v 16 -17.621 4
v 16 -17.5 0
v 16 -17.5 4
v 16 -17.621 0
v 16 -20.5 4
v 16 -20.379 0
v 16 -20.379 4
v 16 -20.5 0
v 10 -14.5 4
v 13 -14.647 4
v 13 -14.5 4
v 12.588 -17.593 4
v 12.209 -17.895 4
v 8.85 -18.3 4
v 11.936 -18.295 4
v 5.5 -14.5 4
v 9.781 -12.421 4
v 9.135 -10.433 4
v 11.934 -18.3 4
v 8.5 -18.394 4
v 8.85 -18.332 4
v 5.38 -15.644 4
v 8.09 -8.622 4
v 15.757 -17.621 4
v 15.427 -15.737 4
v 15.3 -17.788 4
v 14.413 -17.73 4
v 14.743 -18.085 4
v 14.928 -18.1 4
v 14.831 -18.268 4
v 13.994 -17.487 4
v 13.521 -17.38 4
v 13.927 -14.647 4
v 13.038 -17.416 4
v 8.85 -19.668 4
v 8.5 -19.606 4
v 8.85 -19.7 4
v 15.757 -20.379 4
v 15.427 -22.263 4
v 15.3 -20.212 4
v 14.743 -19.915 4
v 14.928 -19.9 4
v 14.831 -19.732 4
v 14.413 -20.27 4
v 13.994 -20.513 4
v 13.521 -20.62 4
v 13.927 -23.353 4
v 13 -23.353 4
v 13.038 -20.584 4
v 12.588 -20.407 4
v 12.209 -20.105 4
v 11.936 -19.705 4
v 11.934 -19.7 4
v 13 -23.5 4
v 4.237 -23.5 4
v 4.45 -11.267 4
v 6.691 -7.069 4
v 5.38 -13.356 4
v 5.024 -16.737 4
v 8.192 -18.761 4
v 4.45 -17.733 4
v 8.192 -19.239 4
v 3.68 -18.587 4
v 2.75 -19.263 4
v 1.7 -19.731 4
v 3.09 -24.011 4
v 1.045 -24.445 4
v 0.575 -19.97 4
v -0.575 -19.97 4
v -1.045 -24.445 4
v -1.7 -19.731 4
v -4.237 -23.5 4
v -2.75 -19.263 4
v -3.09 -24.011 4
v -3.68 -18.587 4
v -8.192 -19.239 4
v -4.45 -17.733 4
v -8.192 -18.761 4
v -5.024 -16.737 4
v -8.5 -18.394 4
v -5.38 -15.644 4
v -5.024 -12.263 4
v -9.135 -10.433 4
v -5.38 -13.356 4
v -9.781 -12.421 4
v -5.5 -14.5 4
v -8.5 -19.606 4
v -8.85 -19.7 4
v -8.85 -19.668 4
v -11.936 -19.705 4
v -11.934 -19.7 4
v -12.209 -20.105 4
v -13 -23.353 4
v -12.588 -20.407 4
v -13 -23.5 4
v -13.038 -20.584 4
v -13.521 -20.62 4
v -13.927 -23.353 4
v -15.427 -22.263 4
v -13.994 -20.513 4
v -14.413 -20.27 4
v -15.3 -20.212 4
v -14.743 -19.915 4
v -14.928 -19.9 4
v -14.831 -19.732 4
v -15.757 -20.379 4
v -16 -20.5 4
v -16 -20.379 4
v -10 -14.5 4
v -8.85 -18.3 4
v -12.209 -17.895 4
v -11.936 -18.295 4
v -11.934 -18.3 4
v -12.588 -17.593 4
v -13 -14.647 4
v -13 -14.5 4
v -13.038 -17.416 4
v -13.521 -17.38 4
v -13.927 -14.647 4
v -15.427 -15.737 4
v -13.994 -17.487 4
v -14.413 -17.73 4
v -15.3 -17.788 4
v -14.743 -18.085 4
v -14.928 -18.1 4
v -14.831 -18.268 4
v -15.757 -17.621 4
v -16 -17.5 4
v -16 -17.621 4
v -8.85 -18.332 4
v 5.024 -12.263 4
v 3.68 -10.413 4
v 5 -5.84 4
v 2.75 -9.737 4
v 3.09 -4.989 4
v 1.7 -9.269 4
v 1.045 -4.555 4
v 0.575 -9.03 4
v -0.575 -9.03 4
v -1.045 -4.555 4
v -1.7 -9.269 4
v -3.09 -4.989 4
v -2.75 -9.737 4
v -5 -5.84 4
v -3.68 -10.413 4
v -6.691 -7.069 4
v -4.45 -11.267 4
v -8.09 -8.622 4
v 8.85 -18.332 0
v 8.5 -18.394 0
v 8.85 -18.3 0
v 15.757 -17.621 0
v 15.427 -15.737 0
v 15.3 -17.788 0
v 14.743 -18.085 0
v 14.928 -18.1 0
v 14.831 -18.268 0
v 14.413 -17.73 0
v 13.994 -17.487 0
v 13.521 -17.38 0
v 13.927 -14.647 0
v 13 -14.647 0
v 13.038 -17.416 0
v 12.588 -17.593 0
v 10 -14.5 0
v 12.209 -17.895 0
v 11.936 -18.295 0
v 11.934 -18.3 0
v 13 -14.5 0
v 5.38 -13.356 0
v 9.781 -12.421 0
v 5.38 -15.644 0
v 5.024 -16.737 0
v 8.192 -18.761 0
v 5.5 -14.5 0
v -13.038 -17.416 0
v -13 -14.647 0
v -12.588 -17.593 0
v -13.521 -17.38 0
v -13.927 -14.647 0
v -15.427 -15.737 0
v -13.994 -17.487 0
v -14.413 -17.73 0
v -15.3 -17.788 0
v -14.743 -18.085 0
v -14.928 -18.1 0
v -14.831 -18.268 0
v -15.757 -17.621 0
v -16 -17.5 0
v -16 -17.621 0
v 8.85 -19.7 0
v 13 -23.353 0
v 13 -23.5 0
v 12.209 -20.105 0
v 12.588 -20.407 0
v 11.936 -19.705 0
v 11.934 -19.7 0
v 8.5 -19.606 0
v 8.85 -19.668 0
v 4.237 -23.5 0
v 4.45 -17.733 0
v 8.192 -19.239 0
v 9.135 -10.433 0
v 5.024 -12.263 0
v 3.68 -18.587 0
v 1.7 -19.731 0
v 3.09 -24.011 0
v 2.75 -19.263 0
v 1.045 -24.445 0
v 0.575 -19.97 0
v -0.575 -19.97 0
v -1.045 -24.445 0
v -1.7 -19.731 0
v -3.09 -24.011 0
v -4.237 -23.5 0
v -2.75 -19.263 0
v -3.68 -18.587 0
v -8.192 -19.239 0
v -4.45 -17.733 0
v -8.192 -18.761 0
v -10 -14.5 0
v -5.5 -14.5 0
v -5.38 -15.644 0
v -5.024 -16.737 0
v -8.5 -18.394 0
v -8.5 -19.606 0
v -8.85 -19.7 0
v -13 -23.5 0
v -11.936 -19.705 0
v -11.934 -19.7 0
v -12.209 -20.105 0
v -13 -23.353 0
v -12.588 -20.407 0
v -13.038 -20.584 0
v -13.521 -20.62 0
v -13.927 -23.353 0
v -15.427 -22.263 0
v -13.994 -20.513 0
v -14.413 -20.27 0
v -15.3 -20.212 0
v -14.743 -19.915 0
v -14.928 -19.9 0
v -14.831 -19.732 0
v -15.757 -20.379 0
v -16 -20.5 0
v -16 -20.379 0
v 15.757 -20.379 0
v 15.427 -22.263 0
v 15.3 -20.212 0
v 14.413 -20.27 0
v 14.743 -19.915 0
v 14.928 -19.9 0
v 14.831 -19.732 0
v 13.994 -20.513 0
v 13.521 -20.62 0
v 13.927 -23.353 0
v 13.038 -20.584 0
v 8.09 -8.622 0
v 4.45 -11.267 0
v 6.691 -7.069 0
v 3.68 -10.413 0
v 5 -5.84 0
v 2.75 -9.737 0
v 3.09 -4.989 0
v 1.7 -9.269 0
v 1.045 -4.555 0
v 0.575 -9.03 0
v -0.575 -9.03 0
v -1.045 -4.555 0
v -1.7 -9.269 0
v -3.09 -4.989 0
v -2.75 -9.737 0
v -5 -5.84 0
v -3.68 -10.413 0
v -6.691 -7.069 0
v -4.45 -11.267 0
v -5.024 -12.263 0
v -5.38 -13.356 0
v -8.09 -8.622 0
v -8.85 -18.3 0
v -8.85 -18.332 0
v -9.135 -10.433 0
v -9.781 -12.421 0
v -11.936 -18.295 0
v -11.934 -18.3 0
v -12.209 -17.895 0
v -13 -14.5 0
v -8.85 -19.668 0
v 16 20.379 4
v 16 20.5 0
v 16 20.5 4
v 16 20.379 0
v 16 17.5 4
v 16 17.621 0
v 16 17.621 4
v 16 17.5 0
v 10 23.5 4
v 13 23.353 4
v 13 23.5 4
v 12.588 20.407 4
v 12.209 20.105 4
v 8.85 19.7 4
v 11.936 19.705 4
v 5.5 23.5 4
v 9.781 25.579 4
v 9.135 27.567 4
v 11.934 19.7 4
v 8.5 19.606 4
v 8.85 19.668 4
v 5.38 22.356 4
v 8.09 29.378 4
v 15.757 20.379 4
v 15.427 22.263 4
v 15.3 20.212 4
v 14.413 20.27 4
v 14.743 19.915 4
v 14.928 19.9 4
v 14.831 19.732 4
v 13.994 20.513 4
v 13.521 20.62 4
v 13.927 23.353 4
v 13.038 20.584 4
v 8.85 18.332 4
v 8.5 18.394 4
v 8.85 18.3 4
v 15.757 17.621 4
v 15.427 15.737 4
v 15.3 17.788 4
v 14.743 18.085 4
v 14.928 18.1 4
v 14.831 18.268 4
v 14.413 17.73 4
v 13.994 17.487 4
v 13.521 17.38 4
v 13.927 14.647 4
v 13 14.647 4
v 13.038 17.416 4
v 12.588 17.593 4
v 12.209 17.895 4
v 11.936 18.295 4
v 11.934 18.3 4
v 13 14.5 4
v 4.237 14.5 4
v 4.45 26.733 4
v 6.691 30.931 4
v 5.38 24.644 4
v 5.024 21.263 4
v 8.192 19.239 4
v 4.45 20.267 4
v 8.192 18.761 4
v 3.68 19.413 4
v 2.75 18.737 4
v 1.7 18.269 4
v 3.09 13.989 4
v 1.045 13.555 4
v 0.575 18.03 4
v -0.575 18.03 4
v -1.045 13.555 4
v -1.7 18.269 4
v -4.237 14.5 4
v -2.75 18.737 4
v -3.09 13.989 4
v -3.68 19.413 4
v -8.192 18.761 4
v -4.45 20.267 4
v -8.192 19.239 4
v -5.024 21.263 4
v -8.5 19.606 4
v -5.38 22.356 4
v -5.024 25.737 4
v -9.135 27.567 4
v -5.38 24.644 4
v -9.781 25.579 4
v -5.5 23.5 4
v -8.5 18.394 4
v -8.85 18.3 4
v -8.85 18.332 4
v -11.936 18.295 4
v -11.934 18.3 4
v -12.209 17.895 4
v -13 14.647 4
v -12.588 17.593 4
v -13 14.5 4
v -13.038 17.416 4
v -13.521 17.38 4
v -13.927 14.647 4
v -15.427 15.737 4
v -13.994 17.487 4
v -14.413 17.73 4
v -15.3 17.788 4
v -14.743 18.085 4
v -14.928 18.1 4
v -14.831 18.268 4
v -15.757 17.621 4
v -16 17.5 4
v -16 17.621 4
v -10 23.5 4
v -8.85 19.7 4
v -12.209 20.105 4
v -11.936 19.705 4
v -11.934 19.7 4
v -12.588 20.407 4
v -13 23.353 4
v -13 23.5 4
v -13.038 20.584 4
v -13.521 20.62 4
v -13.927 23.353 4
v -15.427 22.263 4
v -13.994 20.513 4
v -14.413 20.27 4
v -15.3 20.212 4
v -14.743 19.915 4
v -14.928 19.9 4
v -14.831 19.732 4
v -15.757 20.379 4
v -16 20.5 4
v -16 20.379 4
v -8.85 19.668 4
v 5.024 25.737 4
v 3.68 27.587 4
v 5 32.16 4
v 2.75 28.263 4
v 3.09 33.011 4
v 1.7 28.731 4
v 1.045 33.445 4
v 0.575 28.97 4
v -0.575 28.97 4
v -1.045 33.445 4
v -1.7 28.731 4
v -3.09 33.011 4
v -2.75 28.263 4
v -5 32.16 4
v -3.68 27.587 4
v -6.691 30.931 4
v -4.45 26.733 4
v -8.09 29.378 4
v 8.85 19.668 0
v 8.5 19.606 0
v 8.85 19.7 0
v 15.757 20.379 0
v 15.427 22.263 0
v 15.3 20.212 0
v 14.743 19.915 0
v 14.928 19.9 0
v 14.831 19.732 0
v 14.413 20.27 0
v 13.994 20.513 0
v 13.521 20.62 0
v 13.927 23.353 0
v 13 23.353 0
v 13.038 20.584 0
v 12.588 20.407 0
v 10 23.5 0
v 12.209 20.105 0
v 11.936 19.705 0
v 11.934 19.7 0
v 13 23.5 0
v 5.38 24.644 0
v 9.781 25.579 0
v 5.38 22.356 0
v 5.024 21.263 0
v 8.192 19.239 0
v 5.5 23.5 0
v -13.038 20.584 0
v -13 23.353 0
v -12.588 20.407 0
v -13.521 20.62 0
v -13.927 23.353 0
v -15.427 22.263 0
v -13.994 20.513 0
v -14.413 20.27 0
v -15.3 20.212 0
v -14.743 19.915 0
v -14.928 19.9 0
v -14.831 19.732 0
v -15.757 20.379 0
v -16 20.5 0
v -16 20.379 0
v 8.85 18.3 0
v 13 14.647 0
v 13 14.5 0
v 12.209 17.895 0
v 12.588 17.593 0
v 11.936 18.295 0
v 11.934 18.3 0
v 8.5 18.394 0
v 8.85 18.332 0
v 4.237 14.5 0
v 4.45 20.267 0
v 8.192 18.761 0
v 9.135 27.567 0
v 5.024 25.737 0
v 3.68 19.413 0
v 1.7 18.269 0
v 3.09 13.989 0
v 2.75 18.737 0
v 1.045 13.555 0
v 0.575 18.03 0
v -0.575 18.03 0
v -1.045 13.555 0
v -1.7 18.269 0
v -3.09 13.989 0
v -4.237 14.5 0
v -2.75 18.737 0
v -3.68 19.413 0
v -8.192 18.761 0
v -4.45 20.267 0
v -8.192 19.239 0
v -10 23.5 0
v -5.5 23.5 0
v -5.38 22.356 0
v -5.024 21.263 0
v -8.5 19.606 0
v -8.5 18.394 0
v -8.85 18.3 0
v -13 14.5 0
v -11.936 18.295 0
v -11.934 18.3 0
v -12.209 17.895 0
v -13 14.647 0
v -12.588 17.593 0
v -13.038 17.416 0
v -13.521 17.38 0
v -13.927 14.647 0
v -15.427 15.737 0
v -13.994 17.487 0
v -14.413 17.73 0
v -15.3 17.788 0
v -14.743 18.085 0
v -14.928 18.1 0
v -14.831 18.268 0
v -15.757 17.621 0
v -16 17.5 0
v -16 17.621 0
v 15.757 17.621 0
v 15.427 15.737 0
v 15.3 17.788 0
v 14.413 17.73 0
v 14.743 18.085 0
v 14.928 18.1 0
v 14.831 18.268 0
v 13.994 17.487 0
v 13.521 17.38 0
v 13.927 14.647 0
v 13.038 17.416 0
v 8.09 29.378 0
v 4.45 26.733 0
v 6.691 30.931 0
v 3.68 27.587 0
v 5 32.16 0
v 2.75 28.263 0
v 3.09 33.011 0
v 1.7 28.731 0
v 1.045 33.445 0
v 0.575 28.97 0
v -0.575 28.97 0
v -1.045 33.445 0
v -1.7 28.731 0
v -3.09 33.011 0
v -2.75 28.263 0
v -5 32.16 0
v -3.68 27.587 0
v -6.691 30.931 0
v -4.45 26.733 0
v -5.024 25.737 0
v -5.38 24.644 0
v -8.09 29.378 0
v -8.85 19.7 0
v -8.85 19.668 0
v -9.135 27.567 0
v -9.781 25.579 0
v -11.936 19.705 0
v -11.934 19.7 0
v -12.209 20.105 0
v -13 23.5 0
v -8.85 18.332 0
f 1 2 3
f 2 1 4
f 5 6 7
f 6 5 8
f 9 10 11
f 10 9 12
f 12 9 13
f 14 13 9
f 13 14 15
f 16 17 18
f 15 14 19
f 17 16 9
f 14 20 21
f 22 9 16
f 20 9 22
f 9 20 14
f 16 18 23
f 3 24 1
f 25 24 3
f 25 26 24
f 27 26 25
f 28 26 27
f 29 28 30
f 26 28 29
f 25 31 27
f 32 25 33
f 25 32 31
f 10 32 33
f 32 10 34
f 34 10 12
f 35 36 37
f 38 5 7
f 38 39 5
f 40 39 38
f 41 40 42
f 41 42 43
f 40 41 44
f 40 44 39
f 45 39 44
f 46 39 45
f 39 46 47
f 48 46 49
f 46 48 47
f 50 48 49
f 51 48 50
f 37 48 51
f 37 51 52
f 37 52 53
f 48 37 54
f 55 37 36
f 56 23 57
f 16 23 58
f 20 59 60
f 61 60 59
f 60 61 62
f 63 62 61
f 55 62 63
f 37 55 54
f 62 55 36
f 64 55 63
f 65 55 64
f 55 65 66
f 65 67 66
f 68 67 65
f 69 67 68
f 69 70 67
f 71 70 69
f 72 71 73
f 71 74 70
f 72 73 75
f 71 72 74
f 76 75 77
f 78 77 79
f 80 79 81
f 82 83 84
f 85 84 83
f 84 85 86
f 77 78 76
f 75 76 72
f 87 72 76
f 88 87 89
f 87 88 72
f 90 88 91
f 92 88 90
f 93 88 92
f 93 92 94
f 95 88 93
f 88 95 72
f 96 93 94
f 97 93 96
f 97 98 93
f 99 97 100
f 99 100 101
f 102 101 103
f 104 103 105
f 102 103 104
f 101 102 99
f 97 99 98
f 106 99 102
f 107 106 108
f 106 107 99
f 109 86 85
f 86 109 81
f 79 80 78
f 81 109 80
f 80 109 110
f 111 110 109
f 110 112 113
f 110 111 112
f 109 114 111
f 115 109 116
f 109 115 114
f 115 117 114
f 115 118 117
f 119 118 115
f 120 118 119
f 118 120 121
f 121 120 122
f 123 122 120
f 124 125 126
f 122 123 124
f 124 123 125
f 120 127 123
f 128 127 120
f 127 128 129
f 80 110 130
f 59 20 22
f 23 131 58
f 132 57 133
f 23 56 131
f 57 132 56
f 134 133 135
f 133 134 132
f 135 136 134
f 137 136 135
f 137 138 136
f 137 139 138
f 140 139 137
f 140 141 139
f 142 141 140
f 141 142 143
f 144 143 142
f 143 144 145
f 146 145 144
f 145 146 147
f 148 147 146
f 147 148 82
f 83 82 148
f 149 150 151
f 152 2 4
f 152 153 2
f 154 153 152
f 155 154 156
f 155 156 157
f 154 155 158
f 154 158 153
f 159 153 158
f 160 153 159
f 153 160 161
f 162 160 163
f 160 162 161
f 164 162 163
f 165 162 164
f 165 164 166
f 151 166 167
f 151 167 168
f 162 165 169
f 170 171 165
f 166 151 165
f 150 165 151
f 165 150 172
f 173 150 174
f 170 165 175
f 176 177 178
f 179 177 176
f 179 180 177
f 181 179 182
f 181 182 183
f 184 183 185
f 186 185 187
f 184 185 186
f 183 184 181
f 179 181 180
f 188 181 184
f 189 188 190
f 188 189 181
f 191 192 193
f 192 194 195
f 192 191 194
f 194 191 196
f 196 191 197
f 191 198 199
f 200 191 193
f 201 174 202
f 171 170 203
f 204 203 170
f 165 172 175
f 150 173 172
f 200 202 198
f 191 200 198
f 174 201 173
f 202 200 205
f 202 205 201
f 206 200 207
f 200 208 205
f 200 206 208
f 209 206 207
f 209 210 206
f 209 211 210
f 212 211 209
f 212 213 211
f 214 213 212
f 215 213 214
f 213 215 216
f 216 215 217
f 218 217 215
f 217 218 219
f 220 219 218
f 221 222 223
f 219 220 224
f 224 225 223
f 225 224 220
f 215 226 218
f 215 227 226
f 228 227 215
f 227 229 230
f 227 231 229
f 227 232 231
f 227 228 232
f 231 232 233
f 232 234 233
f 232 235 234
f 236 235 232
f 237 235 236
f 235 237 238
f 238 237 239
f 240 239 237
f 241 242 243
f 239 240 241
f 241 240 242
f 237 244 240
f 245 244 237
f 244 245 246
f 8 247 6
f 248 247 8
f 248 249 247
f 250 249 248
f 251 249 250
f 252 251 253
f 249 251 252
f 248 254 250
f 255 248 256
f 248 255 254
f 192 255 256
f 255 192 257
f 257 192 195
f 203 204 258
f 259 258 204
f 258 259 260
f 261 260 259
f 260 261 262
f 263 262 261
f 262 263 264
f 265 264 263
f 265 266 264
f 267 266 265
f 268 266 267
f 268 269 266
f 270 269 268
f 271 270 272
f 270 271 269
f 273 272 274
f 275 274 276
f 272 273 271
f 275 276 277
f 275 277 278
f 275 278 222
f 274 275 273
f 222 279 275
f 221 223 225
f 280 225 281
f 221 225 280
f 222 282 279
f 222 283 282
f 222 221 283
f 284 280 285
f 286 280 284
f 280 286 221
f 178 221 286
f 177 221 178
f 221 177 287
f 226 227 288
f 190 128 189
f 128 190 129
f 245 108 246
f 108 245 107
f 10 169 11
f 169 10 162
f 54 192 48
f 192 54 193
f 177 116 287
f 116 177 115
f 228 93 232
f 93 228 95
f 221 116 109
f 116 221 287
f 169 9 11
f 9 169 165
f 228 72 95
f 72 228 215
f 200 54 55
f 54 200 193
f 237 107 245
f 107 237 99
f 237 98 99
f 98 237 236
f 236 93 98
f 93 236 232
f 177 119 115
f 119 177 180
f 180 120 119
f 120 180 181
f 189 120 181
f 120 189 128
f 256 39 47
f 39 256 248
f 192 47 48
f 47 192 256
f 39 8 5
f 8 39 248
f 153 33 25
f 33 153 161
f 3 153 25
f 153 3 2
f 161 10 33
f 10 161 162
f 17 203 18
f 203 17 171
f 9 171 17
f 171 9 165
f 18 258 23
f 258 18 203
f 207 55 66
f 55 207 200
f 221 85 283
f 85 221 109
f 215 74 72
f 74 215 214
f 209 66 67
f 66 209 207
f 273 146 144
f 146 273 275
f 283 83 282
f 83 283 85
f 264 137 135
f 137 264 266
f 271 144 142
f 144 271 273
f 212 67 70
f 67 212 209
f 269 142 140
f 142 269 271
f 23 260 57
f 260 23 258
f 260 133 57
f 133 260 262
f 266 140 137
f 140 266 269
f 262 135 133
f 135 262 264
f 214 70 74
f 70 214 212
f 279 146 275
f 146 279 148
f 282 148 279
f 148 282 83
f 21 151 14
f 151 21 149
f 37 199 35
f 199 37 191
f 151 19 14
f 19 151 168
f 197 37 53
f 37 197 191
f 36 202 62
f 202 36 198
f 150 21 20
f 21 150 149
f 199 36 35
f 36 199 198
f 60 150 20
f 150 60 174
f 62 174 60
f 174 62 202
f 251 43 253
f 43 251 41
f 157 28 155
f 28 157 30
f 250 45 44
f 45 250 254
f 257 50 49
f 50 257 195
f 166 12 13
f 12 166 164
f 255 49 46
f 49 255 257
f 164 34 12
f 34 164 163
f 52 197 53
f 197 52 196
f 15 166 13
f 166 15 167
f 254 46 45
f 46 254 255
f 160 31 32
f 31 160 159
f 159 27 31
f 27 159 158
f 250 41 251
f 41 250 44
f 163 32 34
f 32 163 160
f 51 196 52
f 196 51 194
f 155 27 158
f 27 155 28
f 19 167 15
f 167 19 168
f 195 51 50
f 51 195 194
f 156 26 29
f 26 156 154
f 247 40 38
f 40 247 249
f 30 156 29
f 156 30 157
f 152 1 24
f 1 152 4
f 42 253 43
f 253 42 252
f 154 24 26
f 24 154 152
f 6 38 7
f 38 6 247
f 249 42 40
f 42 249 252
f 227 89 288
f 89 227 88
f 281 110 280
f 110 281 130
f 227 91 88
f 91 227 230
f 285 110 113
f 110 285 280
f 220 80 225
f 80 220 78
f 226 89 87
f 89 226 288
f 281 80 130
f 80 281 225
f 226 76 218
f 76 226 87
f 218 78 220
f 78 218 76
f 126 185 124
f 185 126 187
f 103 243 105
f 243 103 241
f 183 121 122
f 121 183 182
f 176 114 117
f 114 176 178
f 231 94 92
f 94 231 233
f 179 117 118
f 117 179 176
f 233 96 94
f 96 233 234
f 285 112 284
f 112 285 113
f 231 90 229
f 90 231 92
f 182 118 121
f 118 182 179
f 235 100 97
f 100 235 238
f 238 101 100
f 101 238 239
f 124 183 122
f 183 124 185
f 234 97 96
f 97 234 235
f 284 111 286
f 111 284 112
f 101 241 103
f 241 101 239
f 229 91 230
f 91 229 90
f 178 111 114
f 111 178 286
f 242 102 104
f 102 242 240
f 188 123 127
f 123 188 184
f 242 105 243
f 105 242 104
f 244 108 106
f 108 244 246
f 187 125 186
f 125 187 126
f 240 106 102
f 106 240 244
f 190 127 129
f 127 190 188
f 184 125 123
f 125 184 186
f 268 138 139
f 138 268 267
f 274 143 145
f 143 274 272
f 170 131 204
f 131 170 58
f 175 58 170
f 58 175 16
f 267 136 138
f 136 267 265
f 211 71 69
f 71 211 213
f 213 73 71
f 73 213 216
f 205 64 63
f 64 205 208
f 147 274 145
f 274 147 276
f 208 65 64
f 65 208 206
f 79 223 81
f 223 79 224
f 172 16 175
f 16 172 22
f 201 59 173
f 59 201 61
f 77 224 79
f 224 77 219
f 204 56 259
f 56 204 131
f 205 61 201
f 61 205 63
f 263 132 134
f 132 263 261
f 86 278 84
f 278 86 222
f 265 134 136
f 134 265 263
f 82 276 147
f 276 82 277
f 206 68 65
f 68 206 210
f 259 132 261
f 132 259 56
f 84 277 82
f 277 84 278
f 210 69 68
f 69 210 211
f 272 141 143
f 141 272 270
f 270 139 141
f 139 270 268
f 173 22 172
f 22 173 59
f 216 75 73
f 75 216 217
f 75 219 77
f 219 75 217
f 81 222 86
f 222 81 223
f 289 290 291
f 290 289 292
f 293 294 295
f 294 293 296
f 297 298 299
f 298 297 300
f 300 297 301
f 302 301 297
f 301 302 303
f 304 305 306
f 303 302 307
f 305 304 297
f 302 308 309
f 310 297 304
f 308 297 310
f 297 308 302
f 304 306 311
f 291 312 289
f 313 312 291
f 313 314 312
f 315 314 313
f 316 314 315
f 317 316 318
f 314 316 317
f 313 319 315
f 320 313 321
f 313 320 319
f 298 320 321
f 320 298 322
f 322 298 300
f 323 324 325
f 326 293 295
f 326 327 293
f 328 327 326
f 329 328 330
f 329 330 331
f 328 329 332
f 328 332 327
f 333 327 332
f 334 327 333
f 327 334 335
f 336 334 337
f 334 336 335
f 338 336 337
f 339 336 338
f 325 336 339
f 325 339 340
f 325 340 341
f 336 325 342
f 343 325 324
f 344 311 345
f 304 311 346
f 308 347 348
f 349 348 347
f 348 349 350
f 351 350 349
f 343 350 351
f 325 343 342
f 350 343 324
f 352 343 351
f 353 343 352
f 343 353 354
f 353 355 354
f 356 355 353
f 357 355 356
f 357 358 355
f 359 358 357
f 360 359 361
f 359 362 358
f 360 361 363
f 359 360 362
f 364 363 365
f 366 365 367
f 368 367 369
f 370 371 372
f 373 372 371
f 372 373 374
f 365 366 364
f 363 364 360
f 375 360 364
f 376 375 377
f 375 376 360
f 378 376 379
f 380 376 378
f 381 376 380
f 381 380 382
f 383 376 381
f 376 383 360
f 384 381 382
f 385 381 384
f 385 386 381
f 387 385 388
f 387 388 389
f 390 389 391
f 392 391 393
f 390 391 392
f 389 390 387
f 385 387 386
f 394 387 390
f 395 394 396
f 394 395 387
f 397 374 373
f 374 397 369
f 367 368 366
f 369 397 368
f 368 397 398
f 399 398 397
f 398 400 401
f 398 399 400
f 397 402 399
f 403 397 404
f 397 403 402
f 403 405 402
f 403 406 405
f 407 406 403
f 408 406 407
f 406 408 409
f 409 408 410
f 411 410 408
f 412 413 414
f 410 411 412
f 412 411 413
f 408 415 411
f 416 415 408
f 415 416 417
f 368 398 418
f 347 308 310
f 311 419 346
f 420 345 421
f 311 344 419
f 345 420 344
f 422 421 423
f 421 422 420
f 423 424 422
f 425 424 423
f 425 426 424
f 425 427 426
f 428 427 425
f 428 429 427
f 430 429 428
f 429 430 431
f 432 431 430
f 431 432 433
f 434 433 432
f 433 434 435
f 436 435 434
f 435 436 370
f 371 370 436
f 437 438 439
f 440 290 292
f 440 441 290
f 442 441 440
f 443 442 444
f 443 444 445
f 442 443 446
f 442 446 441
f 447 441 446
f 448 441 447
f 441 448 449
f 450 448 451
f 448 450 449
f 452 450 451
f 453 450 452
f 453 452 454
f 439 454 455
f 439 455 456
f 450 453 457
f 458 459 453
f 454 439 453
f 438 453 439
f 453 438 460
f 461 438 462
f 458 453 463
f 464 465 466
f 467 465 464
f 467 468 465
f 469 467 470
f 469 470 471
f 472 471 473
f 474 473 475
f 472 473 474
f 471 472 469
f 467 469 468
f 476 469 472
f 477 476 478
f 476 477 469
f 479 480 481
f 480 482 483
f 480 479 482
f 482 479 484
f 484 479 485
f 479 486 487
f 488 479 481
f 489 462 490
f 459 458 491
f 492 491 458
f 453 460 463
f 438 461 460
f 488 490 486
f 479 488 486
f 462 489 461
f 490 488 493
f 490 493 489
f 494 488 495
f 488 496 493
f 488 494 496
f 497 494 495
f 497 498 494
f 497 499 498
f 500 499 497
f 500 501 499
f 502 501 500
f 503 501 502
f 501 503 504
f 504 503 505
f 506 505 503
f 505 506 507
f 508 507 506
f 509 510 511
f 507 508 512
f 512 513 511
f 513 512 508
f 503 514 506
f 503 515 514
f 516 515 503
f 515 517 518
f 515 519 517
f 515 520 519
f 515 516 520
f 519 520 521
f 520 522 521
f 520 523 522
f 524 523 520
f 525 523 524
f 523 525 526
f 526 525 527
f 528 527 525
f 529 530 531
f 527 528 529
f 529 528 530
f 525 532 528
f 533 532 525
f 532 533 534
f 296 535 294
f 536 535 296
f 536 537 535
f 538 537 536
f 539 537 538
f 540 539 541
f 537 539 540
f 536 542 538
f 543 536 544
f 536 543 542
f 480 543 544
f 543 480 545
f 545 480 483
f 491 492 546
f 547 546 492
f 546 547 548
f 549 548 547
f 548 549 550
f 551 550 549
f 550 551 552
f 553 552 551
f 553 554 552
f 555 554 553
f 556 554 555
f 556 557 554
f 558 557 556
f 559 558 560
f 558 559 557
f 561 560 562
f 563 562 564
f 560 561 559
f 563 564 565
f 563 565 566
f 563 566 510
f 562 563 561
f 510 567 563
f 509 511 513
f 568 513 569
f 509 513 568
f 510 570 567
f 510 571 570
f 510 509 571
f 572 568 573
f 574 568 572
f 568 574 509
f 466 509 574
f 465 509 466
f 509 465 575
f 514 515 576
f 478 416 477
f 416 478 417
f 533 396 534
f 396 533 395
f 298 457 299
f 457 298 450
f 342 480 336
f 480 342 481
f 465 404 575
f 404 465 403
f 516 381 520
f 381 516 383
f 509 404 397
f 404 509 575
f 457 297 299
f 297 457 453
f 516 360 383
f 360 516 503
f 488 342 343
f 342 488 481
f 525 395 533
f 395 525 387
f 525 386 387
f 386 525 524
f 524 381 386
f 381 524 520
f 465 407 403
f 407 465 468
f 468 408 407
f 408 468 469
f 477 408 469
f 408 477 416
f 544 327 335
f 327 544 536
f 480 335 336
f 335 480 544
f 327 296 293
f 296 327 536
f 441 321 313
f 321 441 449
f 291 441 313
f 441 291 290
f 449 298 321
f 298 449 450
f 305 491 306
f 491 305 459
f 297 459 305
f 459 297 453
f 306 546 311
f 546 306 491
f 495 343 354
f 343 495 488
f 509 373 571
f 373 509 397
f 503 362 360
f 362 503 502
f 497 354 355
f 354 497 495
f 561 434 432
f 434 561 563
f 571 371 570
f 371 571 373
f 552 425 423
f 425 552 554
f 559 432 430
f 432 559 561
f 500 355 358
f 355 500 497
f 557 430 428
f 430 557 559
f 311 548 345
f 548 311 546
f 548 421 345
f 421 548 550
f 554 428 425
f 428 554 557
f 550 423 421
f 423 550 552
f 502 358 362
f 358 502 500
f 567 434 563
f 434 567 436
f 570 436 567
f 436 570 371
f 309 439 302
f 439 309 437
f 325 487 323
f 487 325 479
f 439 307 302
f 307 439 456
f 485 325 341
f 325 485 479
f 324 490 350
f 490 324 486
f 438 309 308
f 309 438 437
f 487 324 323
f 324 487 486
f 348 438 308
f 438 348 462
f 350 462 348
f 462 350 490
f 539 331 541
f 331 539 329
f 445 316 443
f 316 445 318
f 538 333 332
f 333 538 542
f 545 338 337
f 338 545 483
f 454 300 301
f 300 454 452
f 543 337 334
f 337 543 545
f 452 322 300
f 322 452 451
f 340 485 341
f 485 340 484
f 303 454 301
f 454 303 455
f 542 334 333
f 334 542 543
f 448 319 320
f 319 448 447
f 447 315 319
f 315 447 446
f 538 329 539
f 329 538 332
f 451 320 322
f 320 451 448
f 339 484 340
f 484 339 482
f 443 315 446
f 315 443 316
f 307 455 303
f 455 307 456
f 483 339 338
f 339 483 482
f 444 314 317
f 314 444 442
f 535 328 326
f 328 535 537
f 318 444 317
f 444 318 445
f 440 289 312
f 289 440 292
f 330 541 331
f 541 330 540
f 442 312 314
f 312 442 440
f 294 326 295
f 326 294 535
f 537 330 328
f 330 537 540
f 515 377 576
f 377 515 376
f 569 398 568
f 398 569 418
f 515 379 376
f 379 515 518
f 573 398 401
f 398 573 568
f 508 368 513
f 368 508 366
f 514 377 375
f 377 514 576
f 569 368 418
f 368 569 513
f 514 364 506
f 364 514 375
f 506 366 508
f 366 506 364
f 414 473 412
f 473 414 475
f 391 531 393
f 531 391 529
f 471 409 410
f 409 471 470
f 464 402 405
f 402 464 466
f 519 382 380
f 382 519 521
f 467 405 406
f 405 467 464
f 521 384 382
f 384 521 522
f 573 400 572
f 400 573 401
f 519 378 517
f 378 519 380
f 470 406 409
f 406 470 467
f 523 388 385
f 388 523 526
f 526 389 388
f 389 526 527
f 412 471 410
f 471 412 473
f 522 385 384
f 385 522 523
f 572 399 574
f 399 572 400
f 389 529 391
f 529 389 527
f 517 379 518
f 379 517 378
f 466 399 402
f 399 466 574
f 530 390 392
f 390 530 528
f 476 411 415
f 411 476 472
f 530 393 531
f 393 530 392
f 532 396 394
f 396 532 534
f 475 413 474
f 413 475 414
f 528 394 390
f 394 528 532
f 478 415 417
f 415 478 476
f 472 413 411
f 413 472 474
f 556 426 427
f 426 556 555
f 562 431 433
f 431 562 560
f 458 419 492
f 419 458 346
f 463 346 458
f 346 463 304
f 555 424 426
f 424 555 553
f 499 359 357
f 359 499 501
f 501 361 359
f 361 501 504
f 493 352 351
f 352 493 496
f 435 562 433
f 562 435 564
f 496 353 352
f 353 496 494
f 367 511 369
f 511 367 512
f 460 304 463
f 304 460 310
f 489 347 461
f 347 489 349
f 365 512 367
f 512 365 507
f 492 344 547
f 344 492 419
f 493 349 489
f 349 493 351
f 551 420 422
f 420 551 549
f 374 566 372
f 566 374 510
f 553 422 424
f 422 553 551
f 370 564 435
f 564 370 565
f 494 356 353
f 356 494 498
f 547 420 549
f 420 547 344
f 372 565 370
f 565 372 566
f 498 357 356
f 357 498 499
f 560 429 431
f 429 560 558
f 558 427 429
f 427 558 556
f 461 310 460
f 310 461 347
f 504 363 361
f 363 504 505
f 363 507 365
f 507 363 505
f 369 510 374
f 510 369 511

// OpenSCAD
// Filament clip

ol = 32;     // Overall length
ow = 9;     // Overall width
oh = 4;      // Overall height
cr = 3;      // Corner radius
d1 = 3.25;   // Diameter of filament
d2 = 2.8;    // Diameter of clip entry
d3 = 20;     // Diameter of finger grip
d4 = 11;     // Diamater of finger grip hole

module RoundedRectPlate(l, w, h, r)
{
    translate([0,0,h/2])
    {
        cube(size=[l,w-2*r,h], center=true);
        cube(size=[l-2*r,w,h], center=true);
    }
    for (dx = [-(l/2-r),(l/2-r)])
    {
        for (dy = [-(w/2-r),(w/2-r)])
        {
            translate([dx,dy,0]) cylinder(r=r, h=h);
        }
    }
}

module CutoutHole(x,y,r,h)
{
    delta = 0.5;
    translate([x,y,-delta]) cylinder(r=r,h=h+2*delta,$fs=0.5);
}

module CutoutCube(x,y,dx,dy,h)
{
    delta = 0.5;
    translate([x,y,h/2]) cube(size=[dx,dy,h+2*delta], center=true);
}

module CutoutSlot(x,y,dx,dy,h)
{
    delta = 0.5;
    translate([x,y,h/2])   cube(size=[dx,dy,h+2*delta], center=true);
    translate([x-dx/2,y,-delta]) cylinder(r=dy/2,h=h+2*delta,$fs=0.5);
    translate([x+dx/2,y,-delta]) cylinder(r=dy/2,h=h+2*delta,$fs=0.5);
}

// dir: 0: +x
//      1: +y
//      2: -x
//      3: -y
module FilamentJaw(pos,dir,fd,fe,h)
{
    translate(pos)
    {
        rotate([0,0,dir*90])
        {
            CutoutHole(-fd*0.8, 0, fd/2, h);
            CutoutHole(    0  , 0, fe/2, h);
            CutoutSlot(-fd*1.7, 0, fd, fe/2, h);
        }
    }
}

module FilamentClip()
{
    difference()
    {
        union()
        {
            RoundedRectPlate(ol, ow, oh, cr );
            translate([0,ow/2,0]) cylinder(r=d3/2, h=oh);
        }
        CutoutHole(0, ow/2, d4/2, oh);
        FilamentJaw([ ol/2,0,0], 0, d1, d2, oh);
        FilamentJaw([-ol/2,0,0], 2, d1, d2, oh);
        //FilamentJaw([ ol/4,-ow/2,0],3,d1,d2,oh);
        //FilamentJaw([-ol/4,-ow/2,0],3,d1,d2,oh);
    }
}

yd = ow+d3/2;
for (yo = [-yd,yd])
{
    translate([0,yo,0]) FilamentClip();
}
